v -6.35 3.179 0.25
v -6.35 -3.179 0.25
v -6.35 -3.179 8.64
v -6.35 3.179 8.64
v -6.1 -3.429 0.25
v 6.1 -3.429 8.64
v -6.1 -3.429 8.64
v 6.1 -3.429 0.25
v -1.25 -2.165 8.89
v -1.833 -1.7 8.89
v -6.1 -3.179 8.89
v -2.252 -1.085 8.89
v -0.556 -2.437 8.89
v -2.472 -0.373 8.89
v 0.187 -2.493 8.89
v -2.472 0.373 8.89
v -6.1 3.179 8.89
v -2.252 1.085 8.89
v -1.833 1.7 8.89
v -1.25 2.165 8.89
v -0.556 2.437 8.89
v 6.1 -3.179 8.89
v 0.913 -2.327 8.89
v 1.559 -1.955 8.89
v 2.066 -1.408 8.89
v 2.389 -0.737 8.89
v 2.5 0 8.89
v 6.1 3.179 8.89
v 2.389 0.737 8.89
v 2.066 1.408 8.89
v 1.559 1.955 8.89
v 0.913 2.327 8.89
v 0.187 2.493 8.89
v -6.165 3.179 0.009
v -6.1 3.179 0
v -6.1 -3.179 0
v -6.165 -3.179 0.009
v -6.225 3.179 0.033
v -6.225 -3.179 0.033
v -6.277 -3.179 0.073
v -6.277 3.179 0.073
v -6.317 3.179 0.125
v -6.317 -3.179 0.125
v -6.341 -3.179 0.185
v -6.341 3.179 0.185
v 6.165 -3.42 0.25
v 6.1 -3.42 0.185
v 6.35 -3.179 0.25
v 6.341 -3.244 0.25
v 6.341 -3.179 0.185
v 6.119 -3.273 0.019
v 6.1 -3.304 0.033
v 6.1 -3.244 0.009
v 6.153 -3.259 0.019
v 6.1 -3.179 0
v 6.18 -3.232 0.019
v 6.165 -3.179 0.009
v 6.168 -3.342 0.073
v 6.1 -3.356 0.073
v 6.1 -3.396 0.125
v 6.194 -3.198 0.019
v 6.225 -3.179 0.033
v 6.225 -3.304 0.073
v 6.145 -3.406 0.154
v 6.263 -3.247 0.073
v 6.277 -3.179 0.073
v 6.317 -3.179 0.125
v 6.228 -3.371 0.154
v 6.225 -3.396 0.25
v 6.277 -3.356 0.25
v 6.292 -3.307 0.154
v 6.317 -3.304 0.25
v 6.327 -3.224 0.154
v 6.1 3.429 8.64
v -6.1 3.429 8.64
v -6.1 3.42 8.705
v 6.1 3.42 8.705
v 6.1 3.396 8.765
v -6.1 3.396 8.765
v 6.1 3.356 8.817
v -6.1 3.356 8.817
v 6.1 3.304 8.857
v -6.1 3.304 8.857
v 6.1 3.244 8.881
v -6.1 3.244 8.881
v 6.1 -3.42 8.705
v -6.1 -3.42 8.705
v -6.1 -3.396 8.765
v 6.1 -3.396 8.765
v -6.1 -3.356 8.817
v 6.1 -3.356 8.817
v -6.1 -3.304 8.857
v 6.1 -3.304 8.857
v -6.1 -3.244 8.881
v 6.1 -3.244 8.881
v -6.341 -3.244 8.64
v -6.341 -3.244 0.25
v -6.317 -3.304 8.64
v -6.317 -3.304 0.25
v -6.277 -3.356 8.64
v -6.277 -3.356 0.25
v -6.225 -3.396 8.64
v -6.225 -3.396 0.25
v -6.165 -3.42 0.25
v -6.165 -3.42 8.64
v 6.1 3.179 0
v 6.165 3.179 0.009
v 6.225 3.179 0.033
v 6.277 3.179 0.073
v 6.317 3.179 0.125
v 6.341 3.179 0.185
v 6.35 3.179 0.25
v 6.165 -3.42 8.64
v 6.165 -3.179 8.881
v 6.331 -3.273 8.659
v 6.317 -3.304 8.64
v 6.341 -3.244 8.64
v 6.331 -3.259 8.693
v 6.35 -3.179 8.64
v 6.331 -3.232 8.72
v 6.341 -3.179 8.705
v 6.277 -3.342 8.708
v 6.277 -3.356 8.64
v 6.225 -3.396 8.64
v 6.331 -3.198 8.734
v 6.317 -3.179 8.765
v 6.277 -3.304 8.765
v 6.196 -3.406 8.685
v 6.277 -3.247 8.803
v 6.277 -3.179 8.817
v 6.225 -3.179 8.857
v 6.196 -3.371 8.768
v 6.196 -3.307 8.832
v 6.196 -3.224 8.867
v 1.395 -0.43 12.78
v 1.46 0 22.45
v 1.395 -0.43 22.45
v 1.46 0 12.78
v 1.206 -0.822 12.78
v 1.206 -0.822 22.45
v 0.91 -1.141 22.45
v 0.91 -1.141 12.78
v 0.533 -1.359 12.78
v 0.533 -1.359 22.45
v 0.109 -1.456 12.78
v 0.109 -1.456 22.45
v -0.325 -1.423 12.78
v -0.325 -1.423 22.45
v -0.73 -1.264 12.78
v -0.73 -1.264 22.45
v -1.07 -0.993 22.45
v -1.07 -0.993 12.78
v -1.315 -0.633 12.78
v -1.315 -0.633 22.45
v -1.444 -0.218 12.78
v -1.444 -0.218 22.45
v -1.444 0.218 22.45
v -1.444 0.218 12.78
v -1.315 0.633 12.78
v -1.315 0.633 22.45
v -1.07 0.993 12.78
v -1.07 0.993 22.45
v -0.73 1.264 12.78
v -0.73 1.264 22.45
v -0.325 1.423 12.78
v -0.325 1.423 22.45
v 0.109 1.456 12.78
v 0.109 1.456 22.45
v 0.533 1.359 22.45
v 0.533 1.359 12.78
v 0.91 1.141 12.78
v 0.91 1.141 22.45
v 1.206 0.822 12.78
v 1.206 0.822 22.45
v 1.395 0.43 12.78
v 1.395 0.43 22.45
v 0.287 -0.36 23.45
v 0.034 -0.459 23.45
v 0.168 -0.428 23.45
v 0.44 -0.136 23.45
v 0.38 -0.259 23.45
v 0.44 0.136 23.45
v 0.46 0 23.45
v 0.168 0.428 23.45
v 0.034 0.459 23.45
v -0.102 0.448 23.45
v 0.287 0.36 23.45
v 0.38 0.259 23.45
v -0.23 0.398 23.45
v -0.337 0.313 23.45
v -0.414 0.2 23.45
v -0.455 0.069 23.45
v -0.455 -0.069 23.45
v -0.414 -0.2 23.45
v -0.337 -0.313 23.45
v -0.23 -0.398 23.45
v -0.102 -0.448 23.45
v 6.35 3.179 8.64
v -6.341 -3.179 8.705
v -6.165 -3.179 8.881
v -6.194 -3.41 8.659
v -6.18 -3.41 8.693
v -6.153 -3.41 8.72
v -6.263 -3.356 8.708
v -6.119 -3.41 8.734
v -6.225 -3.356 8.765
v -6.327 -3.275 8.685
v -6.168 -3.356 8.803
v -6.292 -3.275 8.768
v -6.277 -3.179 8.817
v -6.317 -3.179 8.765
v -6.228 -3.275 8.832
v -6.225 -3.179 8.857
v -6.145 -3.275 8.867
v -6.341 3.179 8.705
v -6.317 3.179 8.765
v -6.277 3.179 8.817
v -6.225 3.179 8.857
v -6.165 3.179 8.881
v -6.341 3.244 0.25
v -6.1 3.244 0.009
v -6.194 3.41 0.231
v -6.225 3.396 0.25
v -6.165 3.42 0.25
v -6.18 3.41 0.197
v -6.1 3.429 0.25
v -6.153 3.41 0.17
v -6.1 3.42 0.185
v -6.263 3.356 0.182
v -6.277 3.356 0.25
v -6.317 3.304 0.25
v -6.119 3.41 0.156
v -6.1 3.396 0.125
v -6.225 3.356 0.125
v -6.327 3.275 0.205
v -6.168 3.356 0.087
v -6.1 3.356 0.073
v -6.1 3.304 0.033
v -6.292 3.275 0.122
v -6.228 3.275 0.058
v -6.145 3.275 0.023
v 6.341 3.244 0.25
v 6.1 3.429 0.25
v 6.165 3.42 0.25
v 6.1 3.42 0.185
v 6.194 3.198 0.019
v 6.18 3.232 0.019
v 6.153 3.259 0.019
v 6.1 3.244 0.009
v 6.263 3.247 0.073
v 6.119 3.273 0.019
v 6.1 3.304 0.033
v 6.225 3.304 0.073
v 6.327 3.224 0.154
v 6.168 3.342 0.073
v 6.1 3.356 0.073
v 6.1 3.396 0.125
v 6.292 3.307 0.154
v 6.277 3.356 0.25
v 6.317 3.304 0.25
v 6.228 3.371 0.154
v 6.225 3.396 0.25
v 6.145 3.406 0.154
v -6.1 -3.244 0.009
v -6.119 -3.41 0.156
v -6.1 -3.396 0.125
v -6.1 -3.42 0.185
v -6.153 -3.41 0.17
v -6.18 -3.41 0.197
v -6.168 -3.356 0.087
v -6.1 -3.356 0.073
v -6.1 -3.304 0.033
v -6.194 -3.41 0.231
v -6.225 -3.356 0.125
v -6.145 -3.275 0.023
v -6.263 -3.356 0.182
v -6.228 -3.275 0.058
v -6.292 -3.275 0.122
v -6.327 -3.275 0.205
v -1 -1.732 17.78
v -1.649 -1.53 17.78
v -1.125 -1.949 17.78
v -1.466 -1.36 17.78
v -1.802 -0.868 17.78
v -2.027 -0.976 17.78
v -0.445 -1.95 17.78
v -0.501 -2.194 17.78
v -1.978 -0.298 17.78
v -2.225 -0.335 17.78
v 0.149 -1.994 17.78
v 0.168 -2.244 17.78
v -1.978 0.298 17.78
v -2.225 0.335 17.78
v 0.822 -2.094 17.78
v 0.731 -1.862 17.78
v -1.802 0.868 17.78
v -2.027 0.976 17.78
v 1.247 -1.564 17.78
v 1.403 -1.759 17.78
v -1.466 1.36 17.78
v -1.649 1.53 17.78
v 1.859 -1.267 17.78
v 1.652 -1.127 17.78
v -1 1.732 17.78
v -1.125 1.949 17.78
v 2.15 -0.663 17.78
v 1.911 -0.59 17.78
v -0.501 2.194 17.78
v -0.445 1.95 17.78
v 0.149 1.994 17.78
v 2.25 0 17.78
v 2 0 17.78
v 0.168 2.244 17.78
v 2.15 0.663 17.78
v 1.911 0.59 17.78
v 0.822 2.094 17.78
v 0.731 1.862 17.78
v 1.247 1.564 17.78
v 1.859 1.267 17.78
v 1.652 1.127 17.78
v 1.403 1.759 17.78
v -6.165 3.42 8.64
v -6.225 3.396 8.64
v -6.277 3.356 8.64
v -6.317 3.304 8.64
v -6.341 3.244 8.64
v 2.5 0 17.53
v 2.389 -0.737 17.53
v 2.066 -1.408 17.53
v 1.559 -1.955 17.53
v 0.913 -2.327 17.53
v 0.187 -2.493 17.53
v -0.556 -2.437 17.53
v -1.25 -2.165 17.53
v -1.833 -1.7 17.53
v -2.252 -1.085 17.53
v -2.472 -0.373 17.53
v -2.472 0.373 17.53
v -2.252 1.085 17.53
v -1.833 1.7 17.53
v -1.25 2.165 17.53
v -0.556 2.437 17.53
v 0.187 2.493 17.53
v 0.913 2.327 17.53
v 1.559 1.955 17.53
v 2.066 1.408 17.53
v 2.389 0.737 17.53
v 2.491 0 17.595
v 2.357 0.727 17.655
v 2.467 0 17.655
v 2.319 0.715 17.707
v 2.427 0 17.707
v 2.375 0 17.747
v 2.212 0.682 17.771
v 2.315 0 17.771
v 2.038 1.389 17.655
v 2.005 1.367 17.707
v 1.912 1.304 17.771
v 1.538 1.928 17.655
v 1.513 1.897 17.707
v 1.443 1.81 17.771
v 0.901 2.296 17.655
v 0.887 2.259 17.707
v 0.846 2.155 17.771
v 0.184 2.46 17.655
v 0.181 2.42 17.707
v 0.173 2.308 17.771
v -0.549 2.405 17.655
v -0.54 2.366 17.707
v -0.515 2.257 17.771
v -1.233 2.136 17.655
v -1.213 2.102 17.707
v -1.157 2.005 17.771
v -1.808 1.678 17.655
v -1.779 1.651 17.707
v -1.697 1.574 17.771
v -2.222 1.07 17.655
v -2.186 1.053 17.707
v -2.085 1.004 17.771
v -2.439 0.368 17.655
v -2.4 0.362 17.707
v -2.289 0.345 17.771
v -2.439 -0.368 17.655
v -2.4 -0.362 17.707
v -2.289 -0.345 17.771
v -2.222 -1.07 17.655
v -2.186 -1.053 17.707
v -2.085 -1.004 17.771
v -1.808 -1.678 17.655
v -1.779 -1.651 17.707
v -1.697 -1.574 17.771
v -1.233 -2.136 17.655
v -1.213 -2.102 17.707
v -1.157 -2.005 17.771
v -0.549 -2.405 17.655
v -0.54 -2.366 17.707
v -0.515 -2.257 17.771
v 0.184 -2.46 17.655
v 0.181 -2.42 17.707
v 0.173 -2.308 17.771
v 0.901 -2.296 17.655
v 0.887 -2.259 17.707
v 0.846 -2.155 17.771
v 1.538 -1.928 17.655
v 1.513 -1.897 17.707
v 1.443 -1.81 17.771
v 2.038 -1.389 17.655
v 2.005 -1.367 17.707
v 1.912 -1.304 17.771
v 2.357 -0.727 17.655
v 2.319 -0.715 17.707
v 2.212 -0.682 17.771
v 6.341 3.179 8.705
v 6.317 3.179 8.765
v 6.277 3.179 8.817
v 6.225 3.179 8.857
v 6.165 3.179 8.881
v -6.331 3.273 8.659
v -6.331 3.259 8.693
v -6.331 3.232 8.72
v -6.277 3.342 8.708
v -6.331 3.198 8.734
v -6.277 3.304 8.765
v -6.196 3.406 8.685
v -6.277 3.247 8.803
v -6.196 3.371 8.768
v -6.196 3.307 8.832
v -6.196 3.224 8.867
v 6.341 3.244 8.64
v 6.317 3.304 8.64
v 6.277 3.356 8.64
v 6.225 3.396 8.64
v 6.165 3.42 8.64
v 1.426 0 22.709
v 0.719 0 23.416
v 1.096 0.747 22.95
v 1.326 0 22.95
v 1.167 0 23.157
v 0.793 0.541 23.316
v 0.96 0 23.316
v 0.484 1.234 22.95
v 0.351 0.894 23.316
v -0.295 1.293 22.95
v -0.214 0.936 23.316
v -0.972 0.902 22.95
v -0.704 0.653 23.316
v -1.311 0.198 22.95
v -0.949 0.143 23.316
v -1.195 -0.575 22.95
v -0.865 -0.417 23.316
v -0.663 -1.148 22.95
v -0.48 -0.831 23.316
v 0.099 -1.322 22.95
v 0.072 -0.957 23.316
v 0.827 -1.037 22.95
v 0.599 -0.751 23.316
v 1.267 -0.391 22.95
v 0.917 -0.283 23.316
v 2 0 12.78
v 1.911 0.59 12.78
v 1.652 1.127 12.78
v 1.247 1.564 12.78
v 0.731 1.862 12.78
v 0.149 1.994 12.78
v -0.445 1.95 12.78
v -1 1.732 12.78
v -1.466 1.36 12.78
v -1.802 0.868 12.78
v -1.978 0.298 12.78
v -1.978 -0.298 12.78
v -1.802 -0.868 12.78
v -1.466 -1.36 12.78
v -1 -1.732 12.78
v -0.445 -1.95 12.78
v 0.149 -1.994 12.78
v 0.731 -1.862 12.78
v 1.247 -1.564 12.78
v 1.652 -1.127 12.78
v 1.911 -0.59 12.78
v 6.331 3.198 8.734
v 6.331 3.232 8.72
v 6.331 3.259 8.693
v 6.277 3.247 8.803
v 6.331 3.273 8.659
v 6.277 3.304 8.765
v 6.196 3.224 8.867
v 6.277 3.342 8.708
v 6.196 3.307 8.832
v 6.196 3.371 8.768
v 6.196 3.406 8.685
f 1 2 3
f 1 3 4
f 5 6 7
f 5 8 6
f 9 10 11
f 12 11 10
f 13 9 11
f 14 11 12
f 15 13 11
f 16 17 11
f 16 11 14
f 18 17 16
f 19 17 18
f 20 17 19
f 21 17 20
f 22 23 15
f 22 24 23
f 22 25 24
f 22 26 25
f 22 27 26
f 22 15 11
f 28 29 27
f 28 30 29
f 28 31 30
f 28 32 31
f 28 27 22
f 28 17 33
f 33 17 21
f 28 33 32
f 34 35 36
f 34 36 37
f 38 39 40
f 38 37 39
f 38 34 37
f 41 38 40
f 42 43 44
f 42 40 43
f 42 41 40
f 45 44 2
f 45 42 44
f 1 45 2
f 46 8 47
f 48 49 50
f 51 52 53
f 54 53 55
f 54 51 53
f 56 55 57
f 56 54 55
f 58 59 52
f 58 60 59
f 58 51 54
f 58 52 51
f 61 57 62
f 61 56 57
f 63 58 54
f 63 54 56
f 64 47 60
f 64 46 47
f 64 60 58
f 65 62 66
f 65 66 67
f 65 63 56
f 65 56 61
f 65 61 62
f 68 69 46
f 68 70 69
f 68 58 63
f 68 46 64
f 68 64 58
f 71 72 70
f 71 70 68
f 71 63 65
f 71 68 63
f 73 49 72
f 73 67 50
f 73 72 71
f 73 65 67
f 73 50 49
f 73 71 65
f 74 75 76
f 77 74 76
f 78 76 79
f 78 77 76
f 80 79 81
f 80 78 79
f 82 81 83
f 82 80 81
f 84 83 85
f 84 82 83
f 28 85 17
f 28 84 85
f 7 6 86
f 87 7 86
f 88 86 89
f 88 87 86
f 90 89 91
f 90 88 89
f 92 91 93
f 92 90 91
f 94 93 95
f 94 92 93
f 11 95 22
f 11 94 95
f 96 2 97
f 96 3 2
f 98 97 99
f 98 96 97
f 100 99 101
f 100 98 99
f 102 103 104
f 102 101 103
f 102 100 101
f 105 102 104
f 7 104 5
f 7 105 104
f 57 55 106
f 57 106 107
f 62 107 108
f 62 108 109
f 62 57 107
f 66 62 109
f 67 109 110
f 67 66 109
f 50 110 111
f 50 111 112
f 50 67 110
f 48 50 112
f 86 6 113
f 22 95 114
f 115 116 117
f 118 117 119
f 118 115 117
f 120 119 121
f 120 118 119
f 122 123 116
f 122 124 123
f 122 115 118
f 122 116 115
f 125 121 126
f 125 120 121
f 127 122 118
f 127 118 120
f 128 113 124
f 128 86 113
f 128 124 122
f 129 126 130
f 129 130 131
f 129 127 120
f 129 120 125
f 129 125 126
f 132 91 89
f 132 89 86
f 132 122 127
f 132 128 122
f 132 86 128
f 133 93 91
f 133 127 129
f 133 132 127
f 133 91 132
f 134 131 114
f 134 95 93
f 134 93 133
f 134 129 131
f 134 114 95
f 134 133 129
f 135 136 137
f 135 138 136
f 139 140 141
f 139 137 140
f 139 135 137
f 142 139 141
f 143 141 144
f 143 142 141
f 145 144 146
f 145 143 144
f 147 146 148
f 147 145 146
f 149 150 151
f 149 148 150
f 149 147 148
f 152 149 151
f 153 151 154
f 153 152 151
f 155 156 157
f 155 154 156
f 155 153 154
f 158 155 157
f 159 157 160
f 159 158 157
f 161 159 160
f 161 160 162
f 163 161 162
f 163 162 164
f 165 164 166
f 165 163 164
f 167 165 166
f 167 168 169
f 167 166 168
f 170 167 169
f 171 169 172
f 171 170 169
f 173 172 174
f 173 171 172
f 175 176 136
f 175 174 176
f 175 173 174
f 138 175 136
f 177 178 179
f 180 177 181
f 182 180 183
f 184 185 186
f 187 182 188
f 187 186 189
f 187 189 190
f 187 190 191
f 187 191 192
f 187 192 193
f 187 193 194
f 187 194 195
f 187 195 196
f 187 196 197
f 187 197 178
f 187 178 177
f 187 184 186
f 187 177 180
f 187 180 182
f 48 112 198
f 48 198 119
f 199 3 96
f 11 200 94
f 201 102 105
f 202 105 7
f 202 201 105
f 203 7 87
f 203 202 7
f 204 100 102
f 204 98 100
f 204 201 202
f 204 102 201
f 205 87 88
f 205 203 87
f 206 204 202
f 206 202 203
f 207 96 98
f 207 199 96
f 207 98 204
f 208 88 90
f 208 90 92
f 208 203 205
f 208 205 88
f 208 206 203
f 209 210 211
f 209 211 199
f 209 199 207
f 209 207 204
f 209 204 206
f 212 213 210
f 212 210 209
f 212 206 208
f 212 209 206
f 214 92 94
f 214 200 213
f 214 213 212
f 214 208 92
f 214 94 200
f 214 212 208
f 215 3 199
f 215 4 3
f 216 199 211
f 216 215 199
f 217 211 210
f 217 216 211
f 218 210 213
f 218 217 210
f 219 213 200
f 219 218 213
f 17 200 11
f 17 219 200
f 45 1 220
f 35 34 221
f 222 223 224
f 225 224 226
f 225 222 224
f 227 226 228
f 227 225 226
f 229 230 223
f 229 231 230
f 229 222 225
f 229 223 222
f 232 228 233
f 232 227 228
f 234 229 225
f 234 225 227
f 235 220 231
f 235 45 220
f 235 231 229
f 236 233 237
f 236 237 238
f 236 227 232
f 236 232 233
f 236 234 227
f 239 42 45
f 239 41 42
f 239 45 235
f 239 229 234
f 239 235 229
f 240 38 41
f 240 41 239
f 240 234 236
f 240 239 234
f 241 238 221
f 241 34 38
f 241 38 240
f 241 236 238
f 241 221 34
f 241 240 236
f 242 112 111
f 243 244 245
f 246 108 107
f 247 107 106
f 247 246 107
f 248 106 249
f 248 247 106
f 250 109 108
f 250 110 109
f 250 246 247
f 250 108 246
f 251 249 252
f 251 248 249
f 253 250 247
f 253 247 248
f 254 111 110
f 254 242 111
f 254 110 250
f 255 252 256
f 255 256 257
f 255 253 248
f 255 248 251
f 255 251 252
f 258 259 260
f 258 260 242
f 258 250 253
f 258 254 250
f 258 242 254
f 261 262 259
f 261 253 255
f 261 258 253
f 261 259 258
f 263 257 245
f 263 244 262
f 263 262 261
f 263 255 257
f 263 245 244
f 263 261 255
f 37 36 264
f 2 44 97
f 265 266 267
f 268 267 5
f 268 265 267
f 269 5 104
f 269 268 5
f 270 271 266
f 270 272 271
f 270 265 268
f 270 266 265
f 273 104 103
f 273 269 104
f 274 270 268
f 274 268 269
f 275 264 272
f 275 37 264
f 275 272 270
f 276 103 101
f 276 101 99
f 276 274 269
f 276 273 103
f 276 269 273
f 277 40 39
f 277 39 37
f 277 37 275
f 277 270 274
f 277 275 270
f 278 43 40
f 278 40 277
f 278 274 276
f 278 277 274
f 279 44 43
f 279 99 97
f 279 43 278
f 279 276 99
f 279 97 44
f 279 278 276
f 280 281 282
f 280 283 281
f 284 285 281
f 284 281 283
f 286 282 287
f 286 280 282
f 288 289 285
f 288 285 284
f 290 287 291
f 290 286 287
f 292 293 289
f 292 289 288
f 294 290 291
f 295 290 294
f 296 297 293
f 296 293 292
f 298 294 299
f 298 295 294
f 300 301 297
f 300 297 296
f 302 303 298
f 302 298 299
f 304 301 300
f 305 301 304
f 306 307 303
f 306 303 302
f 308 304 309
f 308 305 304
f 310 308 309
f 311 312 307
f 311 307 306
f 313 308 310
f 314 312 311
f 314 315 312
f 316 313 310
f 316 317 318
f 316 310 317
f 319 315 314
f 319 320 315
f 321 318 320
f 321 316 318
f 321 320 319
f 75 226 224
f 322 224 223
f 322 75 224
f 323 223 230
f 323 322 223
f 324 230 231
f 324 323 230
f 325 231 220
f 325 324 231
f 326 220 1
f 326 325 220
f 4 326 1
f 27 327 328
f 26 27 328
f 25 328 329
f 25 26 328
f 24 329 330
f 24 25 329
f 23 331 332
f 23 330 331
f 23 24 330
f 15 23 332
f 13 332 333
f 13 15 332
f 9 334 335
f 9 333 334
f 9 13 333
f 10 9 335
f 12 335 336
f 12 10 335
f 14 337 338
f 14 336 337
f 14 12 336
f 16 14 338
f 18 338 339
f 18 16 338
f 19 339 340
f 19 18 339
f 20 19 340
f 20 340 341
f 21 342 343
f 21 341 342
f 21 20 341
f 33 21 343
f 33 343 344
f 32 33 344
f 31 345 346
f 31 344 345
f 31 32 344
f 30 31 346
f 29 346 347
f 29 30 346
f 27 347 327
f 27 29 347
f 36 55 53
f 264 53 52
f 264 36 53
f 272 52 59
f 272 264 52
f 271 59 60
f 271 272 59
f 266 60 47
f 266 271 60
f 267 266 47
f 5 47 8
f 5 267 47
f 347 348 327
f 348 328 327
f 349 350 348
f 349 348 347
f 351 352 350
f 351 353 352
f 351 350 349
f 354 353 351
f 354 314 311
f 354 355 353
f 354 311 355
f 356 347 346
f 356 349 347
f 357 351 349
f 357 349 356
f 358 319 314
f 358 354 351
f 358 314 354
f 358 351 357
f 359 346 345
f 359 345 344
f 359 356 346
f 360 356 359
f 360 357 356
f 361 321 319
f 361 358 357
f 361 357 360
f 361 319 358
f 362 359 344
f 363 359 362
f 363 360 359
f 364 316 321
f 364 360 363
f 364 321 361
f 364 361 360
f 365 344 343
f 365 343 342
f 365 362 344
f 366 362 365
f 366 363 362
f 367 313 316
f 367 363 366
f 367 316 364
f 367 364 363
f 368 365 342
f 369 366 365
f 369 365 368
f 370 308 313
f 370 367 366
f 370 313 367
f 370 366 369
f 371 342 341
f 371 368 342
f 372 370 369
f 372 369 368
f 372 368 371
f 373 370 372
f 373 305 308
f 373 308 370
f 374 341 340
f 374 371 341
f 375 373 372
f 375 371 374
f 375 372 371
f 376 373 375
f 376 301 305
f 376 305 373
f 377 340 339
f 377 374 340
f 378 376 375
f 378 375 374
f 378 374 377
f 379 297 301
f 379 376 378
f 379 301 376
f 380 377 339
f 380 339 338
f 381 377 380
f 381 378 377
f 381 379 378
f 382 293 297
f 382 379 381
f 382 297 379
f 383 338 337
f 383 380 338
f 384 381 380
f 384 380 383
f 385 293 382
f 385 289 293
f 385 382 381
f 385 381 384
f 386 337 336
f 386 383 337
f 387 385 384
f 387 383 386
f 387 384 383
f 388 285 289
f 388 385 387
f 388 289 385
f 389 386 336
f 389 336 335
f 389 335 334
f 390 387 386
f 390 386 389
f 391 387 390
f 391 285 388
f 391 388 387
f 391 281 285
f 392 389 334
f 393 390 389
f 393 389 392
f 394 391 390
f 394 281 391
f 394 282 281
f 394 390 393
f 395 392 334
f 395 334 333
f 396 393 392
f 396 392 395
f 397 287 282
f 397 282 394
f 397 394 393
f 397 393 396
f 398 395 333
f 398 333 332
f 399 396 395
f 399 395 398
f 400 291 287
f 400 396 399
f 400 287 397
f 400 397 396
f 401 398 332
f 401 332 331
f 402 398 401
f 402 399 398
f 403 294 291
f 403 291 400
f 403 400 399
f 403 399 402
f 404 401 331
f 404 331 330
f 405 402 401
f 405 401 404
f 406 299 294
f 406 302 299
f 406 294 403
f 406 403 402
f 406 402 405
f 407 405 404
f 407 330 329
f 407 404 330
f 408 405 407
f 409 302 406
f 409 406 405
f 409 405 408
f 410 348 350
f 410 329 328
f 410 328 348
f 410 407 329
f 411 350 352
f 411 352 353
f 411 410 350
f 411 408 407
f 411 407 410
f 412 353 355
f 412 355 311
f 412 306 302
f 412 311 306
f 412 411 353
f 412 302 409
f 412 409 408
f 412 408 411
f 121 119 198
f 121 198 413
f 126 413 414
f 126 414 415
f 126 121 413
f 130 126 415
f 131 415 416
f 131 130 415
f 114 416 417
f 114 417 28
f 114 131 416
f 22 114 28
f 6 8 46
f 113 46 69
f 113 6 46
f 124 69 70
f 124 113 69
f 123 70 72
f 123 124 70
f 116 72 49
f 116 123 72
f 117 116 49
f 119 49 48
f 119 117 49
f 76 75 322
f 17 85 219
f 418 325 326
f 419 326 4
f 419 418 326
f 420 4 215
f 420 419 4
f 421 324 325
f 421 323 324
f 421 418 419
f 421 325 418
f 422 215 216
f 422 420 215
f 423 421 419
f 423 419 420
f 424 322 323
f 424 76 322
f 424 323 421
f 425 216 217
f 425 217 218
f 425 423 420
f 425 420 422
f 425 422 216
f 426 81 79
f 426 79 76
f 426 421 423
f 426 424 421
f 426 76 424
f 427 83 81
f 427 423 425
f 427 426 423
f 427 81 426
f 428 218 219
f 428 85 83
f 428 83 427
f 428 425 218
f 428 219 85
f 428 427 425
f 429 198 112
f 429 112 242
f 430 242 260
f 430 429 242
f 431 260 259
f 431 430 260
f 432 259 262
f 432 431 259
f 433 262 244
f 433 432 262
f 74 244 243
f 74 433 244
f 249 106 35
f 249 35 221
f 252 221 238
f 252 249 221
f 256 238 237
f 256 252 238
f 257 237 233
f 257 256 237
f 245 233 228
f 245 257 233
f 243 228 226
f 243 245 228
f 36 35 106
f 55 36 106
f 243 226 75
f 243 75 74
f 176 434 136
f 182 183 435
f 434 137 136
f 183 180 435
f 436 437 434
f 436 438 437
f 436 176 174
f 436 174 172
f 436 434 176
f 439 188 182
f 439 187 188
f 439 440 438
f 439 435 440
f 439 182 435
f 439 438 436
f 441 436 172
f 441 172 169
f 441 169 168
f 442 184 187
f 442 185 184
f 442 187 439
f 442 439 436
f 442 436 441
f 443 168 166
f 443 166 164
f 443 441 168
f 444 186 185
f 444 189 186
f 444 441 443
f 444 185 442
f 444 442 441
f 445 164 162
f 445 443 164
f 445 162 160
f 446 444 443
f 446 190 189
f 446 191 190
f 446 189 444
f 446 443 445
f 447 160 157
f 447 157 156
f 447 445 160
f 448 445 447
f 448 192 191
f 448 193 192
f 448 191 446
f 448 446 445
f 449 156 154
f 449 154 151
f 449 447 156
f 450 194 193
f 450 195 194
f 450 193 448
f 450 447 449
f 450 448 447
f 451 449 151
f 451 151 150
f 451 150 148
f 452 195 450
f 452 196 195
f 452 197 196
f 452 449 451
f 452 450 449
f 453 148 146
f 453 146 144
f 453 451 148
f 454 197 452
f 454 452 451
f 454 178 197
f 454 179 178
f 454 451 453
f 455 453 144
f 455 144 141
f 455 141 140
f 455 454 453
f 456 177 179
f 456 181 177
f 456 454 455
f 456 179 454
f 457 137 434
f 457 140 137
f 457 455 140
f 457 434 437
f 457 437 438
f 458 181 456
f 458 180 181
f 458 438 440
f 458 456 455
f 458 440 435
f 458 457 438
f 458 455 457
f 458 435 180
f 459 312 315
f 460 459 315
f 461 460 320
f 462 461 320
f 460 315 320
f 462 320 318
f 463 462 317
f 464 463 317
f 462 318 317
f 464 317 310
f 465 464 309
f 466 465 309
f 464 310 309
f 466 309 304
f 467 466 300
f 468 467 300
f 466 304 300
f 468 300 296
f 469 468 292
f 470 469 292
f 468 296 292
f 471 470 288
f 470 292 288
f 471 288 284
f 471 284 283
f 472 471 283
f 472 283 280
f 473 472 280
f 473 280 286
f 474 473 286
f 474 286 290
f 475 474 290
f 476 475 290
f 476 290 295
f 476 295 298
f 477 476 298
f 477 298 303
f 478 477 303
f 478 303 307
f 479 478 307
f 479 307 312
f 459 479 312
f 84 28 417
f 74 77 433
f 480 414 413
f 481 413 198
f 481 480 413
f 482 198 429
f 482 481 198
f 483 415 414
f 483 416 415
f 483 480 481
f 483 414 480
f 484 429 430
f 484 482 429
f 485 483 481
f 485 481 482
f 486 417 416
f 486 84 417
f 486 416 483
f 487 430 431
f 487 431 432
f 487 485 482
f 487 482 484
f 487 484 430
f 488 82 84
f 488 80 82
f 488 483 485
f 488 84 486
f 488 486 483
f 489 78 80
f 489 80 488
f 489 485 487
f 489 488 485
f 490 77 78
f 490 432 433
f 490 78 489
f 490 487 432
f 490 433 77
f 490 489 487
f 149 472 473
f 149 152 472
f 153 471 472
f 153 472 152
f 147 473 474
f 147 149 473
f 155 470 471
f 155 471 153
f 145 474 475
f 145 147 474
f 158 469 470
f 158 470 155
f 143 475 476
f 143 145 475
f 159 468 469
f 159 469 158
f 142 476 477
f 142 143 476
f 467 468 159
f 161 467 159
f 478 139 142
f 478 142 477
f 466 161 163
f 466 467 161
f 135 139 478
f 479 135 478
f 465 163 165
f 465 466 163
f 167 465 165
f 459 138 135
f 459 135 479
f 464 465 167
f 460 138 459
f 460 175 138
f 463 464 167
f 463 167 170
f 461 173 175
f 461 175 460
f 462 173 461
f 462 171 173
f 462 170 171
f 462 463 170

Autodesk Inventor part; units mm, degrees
ref_plane "YZ Plane" through (0, 0, 0) normal (1, 0, 0) x (0, 1, 0)
ref_plane "XZ Plane" through (0, 0, 0) normal (0, 1, 0) x (-1, 0, 0)
ref_plane "XY Plane" through (0, 0, 0) normal (0, 0, 1) x (1, 0, 0)
sketch "Skizze1" plane through (0, 0, 0) normal (0, 0, 1) x (1, 0, 0)
  line L0 (-6.35, 3.429) -> (6.35, 3.429)
  line L1 (6.35, 3.429) -> (6.35, -3.429)
  line L2 (6.35, -3.429) -> (-6.35, -3.429)
  line L3 (-6.35, -3.429) -> (-6.35, 3.429)
  point P0 (0, 0)
  point P1 (6.35, 0)
  point P2 (0, -3.429)
  dimension "d0" = 12.7
  dimension "d1" = 6.858
extrude "Extrusion1" add sketch "Skizze1" along normal blind 8.89
sketch "Skizze2" plane through (0, 0, 8.89) normal (0, 0, 1) x (1, 0, 0)
  circle A0 centre (0, 0) radius 2.5
  circle A1 centre (0, 0) radius 2.25
  dimension "d4" = 5
  dimension "d10" = 4.5
extrude "Extrusion2" add sketch "Skizze2" along normal blind 8.89 contours A0 | A1
thread "Gewinde1" size "M6x1" class "6g" standard "ANSI Metric M Profile" full length
fillet "Rundung1" radius 0.25 1 edges at (-2.5, 0, 17.78)
sketch "Skizze3" plane through (0, 0, 17.78) normal (0, 0, 1) x (1, 0, 0)
  circle A0 centre (0, 0) radius 2.25 projected
  circle A1 centre (0, 0) radius 2
  dimension "d11" = 4
extrude "Extrusion3" cut sketch "Skizze3" against normal blind 5 contours A1
sketch "Skizze4" plane through (0, 0, 12.78) normal (0, 0, 1) x (1, 0, 0)
  circle A0 centre (0, 0) radius 2 projected
  circle A1 centre (0, 0) radius 1.46
  dimension "d14" = 2.92
extrude "Extrusion4" add sketch "Skizze4" along normal blind 10.67 contours A1
fillet "Rundung3" radius 0.25 12 edges at (0, 3.429, 8.89) (-6.35, 0, 8.89) (0, -3.429, 8.89) (6.35, 0, 8.89) (-6.35, 0, 0) (-6.35, -3.429, 4.445) (-6.35, 3.429, 4.445) (6.35, 3.429, 4.445) (0, 3.429, 0) (6.35, -3.429, 4.445) (0, -3.429, 0) (6.35, 0, 0)
fillet "Rundung5" radius 1 1 edges at (-1.46, 0, 23.45)
properties part number "Schalter"
